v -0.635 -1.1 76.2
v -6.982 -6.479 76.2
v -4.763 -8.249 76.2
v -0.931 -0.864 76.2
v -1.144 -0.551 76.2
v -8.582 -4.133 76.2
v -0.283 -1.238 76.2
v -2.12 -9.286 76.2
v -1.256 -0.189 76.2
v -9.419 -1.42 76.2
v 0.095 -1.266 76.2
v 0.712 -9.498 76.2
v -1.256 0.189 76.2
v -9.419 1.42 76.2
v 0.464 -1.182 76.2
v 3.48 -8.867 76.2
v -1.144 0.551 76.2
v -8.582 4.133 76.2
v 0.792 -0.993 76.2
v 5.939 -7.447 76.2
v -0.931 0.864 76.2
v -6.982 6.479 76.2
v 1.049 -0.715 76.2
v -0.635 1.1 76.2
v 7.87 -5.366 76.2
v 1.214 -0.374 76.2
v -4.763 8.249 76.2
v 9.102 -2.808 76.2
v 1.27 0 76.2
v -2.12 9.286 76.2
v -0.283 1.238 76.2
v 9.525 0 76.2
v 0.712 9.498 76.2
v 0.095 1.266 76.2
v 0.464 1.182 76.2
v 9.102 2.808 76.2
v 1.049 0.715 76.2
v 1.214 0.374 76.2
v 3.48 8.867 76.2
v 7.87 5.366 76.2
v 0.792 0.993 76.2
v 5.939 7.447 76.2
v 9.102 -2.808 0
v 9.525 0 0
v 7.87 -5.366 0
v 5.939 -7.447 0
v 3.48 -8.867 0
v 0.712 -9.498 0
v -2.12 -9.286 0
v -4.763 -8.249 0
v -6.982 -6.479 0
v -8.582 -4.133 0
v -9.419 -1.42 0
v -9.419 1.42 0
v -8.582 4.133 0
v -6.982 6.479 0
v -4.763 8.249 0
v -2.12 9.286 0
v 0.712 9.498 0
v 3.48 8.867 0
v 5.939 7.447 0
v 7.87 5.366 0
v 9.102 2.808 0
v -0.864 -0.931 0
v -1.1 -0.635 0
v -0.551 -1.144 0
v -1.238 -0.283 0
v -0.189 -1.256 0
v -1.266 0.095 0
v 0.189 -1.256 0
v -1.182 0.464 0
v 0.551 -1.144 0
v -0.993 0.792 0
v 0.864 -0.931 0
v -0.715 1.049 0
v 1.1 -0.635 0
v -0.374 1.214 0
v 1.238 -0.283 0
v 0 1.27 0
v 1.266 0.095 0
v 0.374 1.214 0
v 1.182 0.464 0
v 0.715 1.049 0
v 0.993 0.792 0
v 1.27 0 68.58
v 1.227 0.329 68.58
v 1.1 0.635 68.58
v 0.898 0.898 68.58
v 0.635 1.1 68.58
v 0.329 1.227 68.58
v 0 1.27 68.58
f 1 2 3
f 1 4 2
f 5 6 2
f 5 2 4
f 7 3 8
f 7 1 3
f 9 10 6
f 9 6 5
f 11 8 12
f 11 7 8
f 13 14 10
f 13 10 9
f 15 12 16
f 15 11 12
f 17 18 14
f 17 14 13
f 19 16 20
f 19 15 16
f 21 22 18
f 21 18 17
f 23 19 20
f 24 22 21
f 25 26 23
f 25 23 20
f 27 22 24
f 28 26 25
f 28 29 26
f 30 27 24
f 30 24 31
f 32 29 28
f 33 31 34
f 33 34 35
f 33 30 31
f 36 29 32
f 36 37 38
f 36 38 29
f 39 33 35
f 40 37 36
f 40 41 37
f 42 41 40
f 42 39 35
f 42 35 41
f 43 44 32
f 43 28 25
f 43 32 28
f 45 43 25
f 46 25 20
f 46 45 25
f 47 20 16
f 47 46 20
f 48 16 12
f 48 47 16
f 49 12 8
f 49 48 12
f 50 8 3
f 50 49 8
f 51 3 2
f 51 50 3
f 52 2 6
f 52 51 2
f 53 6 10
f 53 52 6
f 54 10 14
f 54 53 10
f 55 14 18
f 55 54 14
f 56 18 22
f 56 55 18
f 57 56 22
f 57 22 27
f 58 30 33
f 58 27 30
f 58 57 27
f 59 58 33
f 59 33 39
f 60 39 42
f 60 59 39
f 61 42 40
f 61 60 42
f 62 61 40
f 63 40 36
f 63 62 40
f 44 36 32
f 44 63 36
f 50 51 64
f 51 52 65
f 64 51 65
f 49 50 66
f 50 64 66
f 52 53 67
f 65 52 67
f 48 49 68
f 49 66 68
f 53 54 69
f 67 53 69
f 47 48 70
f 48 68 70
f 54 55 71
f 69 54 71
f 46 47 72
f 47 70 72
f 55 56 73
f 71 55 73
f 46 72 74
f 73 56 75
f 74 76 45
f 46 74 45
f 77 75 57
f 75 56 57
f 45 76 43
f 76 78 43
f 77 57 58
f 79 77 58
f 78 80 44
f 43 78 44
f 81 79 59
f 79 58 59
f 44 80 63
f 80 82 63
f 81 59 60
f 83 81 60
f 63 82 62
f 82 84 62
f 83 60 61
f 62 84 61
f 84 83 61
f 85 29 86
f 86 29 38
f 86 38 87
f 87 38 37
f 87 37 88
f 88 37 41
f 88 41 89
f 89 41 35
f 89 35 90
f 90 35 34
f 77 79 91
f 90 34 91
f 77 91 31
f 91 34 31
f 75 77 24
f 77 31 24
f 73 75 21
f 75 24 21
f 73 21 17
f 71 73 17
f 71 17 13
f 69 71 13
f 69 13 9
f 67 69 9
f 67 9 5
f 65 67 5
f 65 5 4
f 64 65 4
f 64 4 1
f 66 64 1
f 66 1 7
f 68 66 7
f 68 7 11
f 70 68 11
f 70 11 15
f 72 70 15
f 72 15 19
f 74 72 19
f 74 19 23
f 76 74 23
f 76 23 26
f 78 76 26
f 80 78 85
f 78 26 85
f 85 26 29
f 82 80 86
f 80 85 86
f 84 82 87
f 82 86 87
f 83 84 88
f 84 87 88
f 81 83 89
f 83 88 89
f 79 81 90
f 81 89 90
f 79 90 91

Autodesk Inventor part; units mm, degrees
ref_plane "YZ Plane" through (0, 0, 0) normal (1, 0, 0) x (0, 1, 0)
ref_plane "XZ Plane" through (0, 0, 0) normal (0, 1, 0) x (-1, 0, 0)
ref_plane "XY Plane" through (0, 0, 0) normal (0, 0, 1) x (1, 0, 0)
sketch "Sketch1" plane through (0, 0, 0) normal (0, 0, 1) x (1, 0, 0)
  circle A0 centre (0, 0) radius 9.525
  dimension "d0" = 19.05
extrude "Extrusion1" add sketch "Sketch1" along normal blind 76.2
sketch "Sketch2" plane through (0, 0, 76.2) normal (0, 0, 1) x (1, 0, 0)
  circle A0 centre (0, 0) radius 9.525 projected
  circle A1 centre (0, 0) radius 1.27
  dimension "d3" = 2.54
extrude "Extrusion2" cut sketch "Sketch2" against normal blind 7.62 contours A1
sketch "Sketch3" plane through (0, 0, 0) normal (0, 0, -1) x (-1, 0, 0)
  circle A0 centre (0, 0) radius 9.525 projected
  circle A1 centre (0, 0) radius 1.27 projected
  circle A2 centre (0, 0) radius 1.27
hole "Hole1" at (0, 0, 0) direction (0, 0, 1) diameter 2.54 end through all
properties part number "Rod"
